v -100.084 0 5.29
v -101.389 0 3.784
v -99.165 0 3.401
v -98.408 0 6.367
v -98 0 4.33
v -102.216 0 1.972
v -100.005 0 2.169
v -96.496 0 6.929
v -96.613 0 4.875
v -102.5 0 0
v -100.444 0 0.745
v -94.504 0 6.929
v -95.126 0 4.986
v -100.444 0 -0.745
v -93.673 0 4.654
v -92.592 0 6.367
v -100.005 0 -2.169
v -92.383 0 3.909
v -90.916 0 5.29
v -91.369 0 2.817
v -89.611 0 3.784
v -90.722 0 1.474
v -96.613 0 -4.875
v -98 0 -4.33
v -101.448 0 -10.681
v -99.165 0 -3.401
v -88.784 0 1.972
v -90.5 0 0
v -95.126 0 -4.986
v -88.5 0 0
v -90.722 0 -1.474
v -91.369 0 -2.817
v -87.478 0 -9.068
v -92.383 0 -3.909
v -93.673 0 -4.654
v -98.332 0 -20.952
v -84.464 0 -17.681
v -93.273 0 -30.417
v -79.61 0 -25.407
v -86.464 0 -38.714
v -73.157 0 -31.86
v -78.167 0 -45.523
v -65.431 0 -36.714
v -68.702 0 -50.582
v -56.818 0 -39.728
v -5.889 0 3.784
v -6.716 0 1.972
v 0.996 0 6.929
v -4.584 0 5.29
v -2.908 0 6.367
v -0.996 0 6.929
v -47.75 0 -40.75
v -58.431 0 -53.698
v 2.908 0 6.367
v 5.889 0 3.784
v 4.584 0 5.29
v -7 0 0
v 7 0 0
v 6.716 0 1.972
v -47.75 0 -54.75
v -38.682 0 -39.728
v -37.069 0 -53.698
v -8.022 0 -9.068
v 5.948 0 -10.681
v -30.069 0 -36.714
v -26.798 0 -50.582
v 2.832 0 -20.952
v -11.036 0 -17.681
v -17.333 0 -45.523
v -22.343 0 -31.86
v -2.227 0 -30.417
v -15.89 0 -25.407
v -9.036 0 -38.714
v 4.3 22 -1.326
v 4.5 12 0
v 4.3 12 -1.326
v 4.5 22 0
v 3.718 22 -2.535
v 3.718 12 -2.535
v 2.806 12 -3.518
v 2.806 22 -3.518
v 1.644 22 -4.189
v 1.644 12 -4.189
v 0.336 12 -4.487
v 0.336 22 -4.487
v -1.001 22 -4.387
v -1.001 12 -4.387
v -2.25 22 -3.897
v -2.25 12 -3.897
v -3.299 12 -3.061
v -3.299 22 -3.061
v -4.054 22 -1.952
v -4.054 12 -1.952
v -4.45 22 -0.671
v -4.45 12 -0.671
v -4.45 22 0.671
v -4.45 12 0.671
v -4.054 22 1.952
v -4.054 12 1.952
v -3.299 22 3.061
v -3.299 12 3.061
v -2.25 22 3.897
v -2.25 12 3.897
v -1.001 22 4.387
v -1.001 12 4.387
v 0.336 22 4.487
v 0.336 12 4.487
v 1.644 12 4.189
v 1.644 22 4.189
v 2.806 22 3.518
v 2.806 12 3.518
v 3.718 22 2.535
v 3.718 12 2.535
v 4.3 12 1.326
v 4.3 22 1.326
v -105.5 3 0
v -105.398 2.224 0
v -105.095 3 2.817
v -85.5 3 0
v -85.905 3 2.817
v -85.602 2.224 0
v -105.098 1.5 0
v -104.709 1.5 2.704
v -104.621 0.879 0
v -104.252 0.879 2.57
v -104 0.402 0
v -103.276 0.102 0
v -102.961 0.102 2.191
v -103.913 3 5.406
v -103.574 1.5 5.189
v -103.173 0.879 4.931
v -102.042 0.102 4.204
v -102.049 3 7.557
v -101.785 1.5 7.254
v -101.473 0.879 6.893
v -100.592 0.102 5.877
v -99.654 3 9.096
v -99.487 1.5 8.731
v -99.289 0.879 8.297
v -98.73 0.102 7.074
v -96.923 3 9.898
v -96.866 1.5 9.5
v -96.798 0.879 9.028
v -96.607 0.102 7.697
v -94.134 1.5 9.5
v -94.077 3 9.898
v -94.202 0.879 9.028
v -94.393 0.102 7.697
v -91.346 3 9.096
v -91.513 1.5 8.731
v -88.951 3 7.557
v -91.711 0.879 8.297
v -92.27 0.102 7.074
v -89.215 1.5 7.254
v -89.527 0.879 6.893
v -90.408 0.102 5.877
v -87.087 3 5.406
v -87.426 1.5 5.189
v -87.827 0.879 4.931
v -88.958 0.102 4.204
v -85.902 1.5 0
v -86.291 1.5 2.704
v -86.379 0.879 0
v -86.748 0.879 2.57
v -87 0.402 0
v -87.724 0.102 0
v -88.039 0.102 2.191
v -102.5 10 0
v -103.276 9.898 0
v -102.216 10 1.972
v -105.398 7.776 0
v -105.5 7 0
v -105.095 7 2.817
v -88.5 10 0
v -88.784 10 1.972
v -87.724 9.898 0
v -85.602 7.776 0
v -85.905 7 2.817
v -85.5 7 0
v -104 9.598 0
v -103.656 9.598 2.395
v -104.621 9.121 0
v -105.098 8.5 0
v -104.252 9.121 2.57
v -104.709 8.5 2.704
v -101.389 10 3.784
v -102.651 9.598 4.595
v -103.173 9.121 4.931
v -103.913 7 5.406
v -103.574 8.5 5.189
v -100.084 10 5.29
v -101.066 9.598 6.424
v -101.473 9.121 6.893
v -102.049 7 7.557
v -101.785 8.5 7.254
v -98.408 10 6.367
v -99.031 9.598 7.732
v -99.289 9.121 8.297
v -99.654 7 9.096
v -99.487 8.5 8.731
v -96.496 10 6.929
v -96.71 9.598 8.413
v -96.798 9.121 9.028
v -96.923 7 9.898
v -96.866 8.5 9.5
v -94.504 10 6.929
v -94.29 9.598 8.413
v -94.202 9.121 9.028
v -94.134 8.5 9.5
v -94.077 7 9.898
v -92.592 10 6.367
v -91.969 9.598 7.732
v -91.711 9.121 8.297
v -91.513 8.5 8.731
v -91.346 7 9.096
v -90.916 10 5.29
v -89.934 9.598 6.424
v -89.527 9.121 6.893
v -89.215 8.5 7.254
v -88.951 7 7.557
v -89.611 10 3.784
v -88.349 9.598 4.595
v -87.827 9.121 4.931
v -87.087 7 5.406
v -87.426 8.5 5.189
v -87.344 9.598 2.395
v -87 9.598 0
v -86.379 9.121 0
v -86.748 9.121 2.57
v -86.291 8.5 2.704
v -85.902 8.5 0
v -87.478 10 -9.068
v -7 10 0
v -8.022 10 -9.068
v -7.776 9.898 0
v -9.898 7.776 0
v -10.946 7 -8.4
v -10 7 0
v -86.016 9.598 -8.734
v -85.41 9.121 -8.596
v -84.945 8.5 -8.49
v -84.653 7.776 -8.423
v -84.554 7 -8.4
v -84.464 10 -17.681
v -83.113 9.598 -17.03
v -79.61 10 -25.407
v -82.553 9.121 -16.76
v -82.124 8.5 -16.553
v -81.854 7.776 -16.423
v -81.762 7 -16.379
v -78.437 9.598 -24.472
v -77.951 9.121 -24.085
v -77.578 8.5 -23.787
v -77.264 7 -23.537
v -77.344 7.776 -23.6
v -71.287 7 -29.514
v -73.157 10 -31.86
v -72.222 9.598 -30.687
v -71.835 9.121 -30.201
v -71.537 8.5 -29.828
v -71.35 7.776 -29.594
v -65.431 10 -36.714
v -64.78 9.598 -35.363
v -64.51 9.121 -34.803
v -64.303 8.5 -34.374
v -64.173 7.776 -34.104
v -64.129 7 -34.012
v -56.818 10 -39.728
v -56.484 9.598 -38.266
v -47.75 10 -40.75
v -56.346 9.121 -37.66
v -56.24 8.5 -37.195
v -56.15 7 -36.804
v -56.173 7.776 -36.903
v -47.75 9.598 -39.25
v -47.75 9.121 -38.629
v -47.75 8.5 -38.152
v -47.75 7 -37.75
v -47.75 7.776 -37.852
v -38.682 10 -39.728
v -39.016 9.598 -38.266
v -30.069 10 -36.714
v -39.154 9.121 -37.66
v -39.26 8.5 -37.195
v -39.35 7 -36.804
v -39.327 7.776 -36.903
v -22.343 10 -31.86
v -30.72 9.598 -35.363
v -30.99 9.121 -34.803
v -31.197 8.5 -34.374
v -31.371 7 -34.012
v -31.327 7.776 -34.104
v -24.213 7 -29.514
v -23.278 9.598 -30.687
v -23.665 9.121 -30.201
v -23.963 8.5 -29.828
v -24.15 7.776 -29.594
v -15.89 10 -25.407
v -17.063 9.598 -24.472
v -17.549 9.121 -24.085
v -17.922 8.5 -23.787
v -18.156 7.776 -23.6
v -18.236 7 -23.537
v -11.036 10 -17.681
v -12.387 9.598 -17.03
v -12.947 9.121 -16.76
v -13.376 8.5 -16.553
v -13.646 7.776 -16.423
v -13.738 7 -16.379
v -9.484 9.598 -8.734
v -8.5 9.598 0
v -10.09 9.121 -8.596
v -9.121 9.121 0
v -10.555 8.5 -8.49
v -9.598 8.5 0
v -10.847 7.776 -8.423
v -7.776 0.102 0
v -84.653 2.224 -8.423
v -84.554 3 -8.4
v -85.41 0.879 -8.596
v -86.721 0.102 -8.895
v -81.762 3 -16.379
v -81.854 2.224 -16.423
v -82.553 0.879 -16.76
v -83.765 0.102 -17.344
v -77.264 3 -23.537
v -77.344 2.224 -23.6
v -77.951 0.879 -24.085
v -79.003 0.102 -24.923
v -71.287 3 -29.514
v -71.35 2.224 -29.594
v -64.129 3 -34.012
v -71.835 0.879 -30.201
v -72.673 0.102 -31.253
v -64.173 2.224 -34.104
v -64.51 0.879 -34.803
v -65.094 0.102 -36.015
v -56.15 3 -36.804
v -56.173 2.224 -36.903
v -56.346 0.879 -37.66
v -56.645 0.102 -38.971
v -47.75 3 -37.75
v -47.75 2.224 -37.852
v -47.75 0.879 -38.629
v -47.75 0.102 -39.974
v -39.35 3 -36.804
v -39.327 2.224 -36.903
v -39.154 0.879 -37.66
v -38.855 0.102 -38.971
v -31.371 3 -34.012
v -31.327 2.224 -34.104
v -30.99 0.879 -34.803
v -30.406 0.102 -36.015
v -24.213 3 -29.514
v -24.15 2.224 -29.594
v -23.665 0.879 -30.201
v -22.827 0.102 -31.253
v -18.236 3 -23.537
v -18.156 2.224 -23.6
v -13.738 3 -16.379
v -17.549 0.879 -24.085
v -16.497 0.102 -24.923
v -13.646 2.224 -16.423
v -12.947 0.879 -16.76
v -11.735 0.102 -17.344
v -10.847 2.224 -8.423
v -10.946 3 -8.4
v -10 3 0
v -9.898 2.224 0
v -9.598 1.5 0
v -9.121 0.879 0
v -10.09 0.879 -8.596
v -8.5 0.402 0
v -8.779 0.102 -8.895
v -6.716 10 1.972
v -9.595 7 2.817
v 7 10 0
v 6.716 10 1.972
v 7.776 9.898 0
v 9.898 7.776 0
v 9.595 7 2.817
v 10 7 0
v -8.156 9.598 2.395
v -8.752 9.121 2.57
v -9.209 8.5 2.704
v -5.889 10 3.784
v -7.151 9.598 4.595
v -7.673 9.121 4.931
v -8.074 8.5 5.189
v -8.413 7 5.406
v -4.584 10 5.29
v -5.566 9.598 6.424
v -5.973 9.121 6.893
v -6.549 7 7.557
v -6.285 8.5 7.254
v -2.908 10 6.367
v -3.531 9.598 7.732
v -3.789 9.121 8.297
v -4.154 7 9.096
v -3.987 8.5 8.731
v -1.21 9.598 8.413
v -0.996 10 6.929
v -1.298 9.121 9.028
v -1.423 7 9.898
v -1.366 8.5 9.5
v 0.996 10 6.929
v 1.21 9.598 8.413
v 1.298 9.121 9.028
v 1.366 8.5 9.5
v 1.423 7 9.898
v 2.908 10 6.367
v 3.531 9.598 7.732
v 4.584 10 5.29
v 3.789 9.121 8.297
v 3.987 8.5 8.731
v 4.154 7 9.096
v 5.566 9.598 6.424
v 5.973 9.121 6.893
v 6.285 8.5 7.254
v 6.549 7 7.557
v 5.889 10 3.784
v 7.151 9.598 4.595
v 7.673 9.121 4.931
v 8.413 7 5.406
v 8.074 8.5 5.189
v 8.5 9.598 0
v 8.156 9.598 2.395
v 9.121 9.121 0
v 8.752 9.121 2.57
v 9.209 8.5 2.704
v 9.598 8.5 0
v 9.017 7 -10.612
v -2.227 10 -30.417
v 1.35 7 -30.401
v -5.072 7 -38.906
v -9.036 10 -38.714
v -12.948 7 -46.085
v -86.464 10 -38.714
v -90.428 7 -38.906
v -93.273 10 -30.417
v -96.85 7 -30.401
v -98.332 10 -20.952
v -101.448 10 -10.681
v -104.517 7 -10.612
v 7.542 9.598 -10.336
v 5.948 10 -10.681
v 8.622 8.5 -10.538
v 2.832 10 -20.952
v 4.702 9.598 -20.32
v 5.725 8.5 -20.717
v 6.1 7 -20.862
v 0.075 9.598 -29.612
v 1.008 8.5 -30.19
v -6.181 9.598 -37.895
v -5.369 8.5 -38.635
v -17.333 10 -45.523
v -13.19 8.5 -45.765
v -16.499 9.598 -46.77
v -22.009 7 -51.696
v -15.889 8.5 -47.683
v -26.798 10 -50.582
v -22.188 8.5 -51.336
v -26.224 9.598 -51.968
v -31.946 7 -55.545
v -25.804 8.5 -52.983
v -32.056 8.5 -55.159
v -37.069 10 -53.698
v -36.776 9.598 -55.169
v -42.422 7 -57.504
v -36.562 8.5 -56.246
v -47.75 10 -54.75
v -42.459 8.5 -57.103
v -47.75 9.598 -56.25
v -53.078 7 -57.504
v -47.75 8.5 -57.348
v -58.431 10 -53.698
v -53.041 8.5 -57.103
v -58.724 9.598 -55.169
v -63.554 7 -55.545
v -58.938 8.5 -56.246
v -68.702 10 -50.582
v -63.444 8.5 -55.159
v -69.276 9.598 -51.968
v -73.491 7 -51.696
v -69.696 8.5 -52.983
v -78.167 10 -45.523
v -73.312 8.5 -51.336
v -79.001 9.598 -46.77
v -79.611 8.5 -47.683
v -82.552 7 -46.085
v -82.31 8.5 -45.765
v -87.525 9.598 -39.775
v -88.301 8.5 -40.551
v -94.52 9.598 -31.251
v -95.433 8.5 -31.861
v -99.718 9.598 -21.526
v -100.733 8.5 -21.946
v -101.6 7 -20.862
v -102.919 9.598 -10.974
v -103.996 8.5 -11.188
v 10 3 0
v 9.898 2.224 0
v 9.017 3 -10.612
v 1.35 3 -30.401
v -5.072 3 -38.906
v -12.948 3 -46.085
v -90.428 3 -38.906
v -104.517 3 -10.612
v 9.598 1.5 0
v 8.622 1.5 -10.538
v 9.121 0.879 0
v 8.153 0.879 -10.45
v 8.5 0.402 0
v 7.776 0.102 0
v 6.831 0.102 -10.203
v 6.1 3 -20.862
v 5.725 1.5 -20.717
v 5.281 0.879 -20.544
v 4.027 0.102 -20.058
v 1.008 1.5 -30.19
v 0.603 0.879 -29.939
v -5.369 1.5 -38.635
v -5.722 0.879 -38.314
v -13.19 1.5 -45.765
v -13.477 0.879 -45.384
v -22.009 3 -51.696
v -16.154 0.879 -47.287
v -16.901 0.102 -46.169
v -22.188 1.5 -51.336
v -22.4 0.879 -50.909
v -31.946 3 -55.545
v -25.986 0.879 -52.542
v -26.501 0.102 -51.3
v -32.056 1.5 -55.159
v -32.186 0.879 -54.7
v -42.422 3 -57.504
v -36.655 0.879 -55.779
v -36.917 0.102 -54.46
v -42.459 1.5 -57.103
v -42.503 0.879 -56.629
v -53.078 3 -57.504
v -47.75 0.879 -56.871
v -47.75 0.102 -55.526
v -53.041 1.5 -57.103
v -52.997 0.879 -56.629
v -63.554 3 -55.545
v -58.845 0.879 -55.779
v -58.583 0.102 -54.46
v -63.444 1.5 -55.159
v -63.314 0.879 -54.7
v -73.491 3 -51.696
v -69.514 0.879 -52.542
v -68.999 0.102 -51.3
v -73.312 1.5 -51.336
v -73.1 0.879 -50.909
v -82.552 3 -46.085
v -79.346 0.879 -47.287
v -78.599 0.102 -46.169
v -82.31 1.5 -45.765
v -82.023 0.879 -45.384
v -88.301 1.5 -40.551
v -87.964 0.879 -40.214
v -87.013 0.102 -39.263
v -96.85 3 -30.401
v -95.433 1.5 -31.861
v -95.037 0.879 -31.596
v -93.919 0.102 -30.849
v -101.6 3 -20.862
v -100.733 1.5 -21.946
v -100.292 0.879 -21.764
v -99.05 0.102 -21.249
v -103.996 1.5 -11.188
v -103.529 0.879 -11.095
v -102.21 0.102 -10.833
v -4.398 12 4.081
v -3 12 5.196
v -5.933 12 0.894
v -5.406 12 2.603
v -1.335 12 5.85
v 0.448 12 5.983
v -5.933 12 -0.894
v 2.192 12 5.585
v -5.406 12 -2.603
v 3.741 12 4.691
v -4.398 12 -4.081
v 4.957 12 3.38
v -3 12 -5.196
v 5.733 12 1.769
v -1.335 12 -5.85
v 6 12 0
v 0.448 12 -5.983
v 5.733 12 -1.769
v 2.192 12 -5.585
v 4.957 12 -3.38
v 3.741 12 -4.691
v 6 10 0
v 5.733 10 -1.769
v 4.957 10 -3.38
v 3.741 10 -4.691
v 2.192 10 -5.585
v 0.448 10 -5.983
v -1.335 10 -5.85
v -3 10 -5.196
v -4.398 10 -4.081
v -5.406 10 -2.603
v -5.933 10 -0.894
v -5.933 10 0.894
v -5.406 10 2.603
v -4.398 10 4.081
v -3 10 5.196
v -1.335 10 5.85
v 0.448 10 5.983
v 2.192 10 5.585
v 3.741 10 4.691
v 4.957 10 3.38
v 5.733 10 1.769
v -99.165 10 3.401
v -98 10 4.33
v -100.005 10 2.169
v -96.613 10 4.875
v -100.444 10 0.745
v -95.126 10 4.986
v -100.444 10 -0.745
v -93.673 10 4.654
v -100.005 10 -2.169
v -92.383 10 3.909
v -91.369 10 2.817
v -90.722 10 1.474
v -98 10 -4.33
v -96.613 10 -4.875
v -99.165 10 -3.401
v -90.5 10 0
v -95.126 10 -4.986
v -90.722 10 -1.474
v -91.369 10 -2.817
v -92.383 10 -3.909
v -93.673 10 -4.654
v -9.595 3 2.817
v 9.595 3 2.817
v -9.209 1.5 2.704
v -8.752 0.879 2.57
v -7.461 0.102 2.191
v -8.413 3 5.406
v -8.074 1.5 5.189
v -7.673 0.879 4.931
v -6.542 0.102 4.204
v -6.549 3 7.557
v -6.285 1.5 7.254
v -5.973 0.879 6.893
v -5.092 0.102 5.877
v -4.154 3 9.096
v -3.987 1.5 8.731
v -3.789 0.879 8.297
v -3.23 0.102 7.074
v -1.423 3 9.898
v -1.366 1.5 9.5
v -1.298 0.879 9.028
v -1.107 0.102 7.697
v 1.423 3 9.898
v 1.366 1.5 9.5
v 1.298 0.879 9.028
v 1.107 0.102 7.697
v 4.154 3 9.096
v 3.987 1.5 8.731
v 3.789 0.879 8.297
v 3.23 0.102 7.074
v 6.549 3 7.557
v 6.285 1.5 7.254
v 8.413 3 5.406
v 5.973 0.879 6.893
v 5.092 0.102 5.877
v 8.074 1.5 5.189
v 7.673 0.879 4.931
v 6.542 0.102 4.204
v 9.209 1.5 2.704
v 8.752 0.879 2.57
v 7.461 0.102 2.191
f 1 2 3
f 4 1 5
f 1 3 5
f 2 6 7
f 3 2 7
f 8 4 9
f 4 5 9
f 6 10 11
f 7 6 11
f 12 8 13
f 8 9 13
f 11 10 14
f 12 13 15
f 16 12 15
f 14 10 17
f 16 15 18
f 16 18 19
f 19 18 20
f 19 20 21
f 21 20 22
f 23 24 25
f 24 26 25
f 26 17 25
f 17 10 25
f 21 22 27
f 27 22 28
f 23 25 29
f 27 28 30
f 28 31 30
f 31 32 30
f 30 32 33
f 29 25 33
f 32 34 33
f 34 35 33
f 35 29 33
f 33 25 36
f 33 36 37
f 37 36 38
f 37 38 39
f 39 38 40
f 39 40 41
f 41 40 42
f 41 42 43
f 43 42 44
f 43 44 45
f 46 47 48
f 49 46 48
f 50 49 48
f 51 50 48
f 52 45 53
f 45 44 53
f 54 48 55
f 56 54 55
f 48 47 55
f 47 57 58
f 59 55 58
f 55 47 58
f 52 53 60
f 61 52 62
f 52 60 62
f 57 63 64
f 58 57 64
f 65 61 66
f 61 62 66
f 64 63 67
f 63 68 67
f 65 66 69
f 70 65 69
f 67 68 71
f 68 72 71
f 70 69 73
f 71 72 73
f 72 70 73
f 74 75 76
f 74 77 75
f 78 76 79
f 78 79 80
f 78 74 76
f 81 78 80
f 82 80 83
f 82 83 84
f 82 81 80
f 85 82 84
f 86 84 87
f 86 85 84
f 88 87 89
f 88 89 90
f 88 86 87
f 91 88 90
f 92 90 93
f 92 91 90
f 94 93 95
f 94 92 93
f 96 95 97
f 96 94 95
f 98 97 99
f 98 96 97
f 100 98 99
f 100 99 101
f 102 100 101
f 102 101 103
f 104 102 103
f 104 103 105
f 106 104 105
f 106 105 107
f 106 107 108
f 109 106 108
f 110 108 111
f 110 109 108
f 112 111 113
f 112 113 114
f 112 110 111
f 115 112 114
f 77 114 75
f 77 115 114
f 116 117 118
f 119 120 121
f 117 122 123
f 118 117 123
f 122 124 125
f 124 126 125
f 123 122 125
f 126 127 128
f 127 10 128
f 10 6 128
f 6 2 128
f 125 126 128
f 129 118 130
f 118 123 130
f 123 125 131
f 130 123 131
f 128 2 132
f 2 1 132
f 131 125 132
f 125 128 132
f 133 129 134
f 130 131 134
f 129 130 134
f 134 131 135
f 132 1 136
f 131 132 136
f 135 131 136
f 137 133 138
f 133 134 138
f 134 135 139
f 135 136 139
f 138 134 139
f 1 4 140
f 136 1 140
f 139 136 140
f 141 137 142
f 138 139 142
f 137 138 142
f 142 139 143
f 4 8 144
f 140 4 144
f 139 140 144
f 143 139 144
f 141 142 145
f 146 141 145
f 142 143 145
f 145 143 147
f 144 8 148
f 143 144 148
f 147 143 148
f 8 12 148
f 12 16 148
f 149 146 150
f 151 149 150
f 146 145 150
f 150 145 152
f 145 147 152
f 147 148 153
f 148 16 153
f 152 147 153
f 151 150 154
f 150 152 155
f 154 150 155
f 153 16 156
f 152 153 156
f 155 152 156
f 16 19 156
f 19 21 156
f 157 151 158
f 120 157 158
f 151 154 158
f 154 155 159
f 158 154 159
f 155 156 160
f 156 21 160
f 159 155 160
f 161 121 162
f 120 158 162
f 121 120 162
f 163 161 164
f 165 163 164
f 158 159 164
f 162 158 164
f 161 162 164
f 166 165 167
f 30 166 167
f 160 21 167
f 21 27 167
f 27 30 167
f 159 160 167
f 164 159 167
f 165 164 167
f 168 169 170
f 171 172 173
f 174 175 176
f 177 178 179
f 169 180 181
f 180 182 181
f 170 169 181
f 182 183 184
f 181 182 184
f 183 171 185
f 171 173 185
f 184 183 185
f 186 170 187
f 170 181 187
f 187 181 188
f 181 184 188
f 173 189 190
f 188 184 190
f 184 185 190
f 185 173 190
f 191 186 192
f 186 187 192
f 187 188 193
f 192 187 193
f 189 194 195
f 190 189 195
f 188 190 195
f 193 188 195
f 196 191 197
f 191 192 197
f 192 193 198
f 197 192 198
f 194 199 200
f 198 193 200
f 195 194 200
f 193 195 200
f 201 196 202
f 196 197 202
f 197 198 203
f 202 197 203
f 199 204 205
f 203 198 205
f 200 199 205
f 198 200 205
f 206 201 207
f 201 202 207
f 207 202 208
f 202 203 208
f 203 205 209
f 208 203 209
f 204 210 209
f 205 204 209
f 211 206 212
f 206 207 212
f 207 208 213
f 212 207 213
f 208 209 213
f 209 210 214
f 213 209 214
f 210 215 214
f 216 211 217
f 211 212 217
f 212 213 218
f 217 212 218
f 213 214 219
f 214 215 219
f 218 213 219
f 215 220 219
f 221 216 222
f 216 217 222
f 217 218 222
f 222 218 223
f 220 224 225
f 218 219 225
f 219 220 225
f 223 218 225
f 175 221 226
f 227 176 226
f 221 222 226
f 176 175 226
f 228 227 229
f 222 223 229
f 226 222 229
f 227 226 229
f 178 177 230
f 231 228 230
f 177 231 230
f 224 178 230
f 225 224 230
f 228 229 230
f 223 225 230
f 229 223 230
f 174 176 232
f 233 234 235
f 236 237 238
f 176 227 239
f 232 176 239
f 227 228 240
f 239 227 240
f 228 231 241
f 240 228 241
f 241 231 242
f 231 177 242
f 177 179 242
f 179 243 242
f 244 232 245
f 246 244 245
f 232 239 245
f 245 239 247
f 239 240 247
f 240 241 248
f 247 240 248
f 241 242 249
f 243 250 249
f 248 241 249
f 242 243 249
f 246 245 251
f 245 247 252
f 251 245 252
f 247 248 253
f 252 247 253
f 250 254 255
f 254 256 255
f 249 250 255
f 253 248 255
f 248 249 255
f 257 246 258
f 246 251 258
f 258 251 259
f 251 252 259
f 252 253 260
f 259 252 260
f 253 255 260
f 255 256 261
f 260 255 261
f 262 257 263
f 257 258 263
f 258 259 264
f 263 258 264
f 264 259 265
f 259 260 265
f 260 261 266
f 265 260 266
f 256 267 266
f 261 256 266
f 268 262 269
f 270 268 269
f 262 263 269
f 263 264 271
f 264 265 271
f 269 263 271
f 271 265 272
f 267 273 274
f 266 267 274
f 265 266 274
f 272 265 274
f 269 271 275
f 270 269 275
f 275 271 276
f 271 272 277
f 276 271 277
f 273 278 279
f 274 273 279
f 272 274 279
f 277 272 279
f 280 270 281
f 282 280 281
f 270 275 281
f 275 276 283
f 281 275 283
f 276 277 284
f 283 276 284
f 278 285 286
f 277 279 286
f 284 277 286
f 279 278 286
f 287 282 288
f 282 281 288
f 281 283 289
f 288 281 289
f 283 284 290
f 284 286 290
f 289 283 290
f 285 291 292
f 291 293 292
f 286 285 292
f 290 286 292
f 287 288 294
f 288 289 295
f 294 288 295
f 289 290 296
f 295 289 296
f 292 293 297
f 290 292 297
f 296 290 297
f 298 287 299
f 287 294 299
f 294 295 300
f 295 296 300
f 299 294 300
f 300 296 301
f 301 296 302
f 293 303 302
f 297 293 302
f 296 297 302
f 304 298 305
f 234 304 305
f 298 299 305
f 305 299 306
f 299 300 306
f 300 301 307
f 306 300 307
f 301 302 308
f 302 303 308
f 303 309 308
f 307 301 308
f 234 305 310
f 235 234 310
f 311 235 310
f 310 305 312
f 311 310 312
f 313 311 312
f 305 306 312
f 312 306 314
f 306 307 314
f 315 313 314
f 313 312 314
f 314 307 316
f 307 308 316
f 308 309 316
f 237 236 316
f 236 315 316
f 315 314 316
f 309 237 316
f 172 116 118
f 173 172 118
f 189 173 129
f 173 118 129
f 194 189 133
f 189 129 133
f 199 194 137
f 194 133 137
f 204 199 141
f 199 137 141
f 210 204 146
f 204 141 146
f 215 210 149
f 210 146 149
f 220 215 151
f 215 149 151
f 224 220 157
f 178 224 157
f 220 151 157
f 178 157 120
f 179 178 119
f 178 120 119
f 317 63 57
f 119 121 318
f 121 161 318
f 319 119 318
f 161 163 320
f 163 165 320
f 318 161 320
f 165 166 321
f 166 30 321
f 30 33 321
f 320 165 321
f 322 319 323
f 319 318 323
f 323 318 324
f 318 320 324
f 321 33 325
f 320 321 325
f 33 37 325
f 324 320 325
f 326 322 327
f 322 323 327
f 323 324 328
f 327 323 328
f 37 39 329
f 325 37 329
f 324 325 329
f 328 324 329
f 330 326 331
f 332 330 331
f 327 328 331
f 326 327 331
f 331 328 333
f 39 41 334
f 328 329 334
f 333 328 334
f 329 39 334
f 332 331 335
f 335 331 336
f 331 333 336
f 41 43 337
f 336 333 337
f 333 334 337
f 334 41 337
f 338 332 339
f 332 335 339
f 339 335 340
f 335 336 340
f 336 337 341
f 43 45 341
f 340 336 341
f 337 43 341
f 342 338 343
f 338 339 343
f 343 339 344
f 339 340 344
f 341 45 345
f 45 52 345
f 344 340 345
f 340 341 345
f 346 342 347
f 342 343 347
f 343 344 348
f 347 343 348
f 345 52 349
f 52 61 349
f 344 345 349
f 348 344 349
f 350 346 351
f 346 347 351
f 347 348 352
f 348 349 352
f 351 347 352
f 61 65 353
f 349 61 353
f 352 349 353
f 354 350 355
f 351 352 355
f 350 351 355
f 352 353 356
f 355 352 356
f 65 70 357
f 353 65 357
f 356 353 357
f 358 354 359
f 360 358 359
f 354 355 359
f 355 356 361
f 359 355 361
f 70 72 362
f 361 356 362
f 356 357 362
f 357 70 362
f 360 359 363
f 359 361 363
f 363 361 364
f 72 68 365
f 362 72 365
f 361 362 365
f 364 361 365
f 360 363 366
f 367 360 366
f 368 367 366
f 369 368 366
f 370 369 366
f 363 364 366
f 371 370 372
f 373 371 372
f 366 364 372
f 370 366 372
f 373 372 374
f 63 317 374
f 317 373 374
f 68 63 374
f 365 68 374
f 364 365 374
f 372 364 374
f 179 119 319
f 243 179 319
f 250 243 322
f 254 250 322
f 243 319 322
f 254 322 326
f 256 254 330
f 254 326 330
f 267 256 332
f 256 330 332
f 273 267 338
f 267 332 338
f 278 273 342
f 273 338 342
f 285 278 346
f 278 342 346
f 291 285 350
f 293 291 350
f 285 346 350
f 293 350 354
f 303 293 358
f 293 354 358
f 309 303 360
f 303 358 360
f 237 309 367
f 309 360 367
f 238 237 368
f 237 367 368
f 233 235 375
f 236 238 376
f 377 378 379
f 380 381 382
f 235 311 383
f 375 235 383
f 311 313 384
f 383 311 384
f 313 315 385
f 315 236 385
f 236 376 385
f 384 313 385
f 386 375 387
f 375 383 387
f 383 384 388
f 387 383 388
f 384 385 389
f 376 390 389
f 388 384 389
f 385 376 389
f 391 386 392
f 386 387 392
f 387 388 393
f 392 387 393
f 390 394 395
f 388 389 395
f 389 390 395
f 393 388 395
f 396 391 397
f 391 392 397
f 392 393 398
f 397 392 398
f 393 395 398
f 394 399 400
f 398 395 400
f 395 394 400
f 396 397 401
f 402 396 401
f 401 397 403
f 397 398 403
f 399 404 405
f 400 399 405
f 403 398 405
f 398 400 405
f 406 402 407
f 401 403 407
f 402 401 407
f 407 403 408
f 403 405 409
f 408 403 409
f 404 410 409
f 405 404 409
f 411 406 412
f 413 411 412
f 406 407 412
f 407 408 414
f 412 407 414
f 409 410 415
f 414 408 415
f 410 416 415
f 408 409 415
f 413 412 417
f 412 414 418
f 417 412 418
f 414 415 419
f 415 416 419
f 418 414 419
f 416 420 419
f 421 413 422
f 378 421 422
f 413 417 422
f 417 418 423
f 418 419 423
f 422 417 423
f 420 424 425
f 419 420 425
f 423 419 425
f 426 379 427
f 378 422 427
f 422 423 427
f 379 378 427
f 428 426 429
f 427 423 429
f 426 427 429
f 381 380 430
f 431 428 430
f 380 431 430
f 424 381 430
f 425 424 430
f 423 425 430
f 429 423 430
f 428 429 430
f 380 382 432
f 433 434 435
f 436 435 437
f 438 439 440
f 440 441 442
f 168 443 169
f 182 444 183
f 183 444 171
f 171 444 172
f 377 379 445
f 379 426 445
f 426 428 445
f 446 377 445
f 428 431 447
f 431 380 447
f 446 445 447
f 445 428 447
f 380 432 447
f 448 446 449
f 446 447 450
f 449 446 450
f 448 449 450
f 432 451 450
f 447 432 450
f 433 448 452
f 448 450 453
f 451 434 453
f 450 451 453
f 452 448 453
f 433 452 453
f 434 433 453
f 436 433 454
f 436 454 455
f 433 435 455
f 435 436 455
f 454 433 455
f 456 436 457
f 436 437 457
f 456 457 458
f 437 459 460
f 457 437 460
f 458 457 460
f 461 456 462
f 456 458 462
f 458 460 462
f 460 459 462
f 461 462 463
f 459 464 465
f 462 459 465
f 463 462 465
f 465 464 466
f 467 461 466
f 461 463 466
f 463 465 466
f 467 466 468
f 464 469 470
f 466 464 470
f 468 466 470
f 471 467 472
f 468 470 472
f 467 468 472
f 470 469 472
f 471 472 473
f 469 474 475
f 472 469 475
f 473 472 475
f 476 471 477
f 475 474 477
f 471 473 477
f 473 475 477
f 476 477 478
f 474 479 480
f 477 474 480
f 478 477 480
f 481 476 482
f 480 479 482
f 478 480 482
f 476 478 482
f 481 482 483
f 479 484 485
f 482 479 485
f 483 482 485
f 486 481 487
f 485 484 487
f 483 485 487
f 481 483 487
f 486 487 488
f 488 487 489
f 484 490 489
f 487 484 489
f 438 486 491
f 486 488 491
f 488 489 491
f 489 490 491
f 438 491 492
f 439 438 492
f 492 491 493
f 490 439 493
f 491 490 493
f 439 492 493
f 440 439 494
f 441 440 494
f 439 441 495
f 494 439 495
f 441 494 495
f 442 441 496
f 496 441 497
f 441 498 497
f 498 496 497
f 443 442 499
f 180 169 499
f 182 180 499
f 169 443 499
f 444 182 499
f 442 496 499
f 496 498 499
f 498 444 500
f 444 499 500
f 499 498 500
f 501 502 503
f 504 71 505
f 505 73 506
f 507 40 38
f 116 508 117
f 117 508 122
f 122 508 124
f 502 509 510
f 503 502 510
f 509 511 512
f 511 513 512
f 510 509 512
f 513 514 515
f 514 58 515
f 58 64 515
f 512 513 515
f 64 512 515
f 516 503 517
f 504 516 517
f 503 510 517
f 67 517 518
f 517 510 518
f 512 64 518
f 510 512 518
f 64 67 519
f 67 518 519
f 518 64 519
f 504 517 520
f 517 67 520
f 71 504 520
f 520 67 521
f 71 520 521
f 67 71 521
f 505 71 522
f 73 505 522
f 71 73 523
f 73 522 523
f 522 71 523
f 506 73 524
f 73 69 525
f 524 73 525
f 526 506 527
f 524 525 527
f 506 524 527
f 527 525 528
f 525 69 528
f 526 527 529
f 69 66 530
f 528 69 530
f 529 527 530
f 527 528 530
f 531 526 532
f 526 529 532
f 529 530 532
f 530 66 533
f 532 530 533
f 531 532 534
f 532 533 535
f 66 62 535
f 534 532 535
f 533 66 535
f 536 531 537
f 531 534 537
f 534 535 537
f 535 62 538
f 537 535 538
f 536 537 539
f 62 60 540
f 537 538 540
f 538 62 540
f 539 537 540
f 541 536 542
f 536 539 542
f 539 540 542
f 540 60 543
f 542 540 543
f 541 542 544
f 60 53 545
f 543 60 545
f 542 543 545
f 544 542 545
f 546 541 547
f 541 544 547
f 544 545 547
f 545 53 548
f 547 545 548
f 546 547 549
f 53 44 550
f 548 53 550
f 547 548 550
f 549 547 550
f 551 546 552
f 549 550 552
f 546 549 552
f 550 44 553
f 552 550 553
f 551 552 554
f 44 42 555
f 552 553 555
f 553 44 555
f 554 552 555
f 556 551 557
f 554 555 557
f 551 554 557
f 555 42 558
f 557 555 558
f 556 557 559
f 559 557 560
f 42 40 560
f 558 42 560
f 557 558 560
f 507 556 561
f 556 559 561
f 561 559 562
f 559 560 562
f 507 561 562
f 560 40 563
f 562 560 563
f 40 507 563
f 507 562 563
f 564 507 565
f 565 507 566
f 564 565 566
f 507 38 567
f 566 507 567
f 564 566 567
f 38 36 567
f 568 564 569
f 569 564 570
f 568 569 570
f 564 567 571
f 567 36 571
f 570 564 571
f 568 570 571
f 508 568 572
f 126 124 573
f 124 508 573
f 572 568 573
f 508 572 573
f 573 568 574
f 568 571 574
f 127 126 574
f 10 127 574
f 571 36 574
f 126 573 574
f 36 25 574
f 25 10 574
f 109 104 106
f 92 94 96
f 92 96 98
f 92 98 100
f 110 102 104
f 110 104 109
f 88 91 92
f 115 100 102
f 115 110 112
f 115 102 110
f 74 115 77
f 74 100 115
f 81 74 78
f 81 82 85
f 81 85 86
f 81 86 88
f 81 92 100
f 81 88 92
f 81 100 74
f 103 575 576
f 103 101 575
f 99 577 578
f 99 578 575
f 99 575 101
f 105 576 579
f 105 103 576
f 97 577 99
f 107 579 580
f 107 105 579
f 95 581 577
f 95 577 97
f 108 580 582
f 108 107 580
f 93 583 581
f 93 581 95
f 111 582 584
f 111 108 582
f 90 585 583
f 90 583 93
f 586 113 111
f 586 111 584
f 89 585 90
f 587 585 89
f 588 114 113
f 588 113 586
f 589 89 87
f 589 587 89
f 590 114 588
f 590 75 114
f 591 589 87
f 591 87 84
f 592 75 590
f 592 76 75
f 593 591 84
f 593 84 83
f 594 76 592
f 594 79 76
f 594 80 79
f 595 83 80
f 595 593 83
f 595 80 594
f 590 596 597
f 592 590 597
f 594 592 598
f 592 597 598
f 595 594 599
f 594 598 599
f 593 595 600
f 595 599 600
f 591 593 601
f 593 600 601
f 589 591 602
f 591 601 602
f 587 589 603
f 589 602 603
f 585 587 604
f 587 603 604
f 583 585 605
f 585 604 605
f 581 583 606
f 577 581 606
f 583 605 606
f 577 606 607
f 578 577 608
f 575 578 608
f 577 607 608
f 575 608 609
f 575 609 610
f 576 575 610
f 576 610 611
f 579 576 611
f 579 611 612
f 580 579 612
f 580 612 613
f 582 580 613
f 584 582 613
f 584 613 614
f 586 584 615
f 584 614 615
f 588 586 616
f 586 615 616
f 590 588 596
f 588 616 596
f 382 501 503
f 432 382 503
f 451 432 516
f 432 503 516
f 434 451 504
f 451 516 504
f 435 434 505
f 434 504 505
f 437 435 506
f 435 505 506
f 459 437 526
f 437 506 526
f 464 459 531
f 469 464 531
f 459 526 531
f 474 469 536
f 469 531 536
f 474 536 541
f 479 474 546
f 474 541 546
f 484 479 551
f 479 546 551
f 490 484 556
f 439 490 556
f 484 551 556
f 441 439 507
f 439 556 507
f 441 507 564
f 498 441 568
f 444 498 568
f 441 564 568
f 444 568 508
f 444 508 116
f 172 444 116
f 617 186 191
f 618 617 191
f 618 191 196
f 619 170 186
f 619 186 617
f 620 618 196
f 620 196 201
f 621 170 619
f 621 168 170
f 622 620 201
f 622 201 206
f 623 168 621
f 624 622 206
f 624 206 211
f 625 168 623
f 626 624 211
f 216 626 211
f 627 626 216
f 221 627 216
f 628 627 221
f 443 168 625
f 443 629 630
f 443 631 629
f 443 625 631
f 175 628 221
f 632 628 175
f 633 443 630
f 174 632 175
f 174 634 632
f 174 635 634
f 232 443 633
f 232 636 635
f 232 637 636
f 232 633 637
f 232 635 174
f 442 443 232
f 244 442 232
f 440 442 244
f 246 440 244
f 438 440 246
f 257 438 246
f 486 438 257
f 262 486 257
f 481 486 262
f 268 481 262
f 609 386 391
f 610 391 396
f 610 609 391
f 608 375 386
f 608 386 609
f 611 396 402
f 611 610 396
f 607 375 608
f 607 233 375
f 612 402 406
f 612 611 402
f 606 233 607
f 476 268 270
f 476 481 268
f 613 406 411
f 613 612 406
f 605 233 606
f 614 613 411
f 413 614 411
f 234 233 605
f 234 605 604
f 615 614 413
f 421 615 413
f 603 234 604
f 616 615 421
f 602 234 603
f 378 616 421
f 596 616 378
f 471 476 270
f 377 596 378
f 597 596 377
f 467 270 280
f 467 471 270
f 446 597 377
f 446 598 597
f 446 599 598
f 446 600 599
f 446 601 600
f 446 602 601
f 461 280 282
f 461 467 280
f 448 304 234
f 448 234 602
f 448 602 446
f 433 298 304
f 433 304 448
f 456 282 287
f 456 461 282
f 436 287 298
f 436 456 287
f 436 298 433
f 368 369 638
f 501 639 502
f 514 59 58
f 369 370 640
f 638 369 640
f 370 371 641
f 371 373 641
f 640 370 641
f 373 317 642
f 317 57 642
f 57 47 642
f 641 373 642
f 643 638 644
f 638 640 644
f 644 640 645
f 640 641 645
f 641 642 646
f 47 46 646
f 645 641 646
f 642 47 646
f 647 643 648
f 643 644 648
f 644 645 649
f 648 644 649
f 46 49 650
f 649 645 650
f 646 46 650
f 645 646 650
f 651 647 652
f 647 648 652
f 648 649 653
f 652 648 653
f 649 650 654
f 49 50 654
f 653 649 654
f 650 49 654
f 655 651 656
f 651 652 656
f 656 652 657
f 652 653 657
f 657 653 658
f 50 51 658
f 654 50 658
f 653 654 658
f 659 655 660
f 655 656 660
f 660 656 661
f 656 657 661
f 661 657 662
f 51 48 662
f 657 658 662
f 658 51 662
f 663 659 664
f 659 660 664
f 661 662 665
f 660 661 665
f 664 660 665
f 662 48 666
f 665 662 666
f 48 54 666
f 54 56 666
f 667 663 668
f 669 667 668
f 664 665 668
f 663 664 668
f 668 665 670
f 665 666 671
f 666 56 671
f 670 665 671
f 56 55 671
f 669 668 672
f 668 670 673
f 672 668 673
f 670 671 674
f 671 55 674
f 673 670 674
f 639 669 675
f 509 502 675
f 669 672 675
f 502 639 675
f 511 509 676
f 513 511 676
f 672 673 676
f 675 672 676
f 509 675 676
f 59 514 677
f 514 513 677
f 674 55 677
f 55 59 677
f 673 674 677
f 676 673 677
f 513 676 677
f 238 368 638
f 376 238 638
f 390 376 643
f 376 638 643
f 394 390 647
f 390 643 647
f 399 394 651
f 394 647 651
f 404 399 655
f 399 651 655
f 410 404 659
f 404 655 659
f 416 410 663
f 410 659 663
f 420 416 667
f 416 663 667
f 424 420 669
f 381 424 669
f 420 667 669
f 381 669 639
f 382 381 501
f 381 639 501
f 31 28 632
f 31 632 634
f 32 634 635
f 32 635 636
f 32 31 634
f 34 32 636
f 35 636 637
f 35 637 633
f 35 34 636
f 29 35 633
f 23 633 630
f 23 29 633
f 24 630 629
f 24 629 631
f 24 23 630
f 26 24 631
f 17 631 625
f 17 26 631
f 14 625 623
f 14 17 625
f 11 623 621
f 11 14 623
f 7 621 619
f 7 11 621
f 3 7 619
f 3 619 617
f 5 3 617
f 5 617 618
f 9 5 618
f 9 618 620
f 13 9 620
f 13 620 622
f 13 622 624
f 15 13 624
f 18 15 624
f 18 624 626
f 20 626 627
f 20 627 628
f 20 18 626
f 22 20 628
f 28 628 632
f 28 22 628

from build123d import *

# Parameters (mm, degrees)
SKETCH1_R                = 5
BOSS_EXTRUDE1_DEPTH      = 10
SKETCH2_R                = 4.5
BOSS_EXTRUDE2_DEPTH      = 12
BOSS_EXTRUDE2_DEPTH_BACK = 10
SKETCH3_R                = 5
BOSS_EXTRUDE3_DEPTH      = 10
SKETCH4_R                = 6
BOSS_EXTRUDE4_DEPTH      = 2
FILLET1_R                = 3


with BuildPart() as part:
    # Sketch1 → Boss-Extrude1 (new body)
    with BuildSketch(Plane(origin=(0, 0, 0), x_dir=(1, 0, 0), z_dir=(0, 1, 0))):
        with BuildLine():
            ThreePointArc((-10, 0), (0, -10), (10, 0))
            ThreePointArc((10, 0), (-47.75, 57.75), (-105.5, 0))
            ThreePointArc((-105.5, 0), (-95.5, -10), (-85.5, 0))
            ThreePointArc((-85.5, 0), (-47.75, 37.75), (-10, 0))
        make_face()
        with Locations((-95.5, 0)):
            Circle(SKETCH1_R, mode=Mode.SUBTRACT)
        Circle(SKETCH1_R, mode=Mode.SUBTRACT)
    extrude(amount=BOSS_EXTRUDE1_DEPTH)



with BuildPart() as body_2:
    # Sketch2 → Boss-Extrude2 (new body, two sides)
    with BuildSketch(Plane(origin=(0, 10, 0), x_dir=(1, 0, 0), z_dir=(0, 1, 0))) as boss_extrude2_sk:
        Circle(SKETCH2_R)
    extrude(amount=BOSS_EXTRUDE2_DEPTH)
    extrude(boss_extrude2_sk.sketch, amount=-BOSS_EXTRUDE2_DEPTH_BACK)


with BuildPart() as part_1:
    add(part.part)

    add(body_2.part)  # Boss-Extrude3 merges body 2
    # Sketch3 → Boss-Extrude3 (add)
    with BuildSketch(Plane(origin=(0, 10, 0), x_dir=(1, 0, 0), z_dir=(0, 1, 0))):
        Circle(SKETCH3_R)
    extrude(amount=-BOSS_EXTRUDE3_DEPTH)

    # Sketch4 → Boss-Extrude4 (add)
    with BuildSketch(Plane(origin=(0, 10, 0), x_dir=(1, 0, 0), z_dir=(0, 1, 0))):
        Circle(SKETCH4_R)
    extrude(amount=BOSS_EXTRUDE4_DEPTH)

    # Fillet1
    fillet1_edges = [part_1.edges().sort_by_distance(p)[0] for p in [
        (-47.75, 10, -37.75),
        (0, 10, 10),
        (-47.75, 10, -57.75),
        (0, 0, 10),
        (-47.75, 0, -37.75),
        (-95.5, 0, 10),
        (-47.75, 0, -57.75),
        (-95.5, 10, 10),
    ]]
    fillet(fillet1_edges, radius=FILLET1_R)


solid = part_1.part
